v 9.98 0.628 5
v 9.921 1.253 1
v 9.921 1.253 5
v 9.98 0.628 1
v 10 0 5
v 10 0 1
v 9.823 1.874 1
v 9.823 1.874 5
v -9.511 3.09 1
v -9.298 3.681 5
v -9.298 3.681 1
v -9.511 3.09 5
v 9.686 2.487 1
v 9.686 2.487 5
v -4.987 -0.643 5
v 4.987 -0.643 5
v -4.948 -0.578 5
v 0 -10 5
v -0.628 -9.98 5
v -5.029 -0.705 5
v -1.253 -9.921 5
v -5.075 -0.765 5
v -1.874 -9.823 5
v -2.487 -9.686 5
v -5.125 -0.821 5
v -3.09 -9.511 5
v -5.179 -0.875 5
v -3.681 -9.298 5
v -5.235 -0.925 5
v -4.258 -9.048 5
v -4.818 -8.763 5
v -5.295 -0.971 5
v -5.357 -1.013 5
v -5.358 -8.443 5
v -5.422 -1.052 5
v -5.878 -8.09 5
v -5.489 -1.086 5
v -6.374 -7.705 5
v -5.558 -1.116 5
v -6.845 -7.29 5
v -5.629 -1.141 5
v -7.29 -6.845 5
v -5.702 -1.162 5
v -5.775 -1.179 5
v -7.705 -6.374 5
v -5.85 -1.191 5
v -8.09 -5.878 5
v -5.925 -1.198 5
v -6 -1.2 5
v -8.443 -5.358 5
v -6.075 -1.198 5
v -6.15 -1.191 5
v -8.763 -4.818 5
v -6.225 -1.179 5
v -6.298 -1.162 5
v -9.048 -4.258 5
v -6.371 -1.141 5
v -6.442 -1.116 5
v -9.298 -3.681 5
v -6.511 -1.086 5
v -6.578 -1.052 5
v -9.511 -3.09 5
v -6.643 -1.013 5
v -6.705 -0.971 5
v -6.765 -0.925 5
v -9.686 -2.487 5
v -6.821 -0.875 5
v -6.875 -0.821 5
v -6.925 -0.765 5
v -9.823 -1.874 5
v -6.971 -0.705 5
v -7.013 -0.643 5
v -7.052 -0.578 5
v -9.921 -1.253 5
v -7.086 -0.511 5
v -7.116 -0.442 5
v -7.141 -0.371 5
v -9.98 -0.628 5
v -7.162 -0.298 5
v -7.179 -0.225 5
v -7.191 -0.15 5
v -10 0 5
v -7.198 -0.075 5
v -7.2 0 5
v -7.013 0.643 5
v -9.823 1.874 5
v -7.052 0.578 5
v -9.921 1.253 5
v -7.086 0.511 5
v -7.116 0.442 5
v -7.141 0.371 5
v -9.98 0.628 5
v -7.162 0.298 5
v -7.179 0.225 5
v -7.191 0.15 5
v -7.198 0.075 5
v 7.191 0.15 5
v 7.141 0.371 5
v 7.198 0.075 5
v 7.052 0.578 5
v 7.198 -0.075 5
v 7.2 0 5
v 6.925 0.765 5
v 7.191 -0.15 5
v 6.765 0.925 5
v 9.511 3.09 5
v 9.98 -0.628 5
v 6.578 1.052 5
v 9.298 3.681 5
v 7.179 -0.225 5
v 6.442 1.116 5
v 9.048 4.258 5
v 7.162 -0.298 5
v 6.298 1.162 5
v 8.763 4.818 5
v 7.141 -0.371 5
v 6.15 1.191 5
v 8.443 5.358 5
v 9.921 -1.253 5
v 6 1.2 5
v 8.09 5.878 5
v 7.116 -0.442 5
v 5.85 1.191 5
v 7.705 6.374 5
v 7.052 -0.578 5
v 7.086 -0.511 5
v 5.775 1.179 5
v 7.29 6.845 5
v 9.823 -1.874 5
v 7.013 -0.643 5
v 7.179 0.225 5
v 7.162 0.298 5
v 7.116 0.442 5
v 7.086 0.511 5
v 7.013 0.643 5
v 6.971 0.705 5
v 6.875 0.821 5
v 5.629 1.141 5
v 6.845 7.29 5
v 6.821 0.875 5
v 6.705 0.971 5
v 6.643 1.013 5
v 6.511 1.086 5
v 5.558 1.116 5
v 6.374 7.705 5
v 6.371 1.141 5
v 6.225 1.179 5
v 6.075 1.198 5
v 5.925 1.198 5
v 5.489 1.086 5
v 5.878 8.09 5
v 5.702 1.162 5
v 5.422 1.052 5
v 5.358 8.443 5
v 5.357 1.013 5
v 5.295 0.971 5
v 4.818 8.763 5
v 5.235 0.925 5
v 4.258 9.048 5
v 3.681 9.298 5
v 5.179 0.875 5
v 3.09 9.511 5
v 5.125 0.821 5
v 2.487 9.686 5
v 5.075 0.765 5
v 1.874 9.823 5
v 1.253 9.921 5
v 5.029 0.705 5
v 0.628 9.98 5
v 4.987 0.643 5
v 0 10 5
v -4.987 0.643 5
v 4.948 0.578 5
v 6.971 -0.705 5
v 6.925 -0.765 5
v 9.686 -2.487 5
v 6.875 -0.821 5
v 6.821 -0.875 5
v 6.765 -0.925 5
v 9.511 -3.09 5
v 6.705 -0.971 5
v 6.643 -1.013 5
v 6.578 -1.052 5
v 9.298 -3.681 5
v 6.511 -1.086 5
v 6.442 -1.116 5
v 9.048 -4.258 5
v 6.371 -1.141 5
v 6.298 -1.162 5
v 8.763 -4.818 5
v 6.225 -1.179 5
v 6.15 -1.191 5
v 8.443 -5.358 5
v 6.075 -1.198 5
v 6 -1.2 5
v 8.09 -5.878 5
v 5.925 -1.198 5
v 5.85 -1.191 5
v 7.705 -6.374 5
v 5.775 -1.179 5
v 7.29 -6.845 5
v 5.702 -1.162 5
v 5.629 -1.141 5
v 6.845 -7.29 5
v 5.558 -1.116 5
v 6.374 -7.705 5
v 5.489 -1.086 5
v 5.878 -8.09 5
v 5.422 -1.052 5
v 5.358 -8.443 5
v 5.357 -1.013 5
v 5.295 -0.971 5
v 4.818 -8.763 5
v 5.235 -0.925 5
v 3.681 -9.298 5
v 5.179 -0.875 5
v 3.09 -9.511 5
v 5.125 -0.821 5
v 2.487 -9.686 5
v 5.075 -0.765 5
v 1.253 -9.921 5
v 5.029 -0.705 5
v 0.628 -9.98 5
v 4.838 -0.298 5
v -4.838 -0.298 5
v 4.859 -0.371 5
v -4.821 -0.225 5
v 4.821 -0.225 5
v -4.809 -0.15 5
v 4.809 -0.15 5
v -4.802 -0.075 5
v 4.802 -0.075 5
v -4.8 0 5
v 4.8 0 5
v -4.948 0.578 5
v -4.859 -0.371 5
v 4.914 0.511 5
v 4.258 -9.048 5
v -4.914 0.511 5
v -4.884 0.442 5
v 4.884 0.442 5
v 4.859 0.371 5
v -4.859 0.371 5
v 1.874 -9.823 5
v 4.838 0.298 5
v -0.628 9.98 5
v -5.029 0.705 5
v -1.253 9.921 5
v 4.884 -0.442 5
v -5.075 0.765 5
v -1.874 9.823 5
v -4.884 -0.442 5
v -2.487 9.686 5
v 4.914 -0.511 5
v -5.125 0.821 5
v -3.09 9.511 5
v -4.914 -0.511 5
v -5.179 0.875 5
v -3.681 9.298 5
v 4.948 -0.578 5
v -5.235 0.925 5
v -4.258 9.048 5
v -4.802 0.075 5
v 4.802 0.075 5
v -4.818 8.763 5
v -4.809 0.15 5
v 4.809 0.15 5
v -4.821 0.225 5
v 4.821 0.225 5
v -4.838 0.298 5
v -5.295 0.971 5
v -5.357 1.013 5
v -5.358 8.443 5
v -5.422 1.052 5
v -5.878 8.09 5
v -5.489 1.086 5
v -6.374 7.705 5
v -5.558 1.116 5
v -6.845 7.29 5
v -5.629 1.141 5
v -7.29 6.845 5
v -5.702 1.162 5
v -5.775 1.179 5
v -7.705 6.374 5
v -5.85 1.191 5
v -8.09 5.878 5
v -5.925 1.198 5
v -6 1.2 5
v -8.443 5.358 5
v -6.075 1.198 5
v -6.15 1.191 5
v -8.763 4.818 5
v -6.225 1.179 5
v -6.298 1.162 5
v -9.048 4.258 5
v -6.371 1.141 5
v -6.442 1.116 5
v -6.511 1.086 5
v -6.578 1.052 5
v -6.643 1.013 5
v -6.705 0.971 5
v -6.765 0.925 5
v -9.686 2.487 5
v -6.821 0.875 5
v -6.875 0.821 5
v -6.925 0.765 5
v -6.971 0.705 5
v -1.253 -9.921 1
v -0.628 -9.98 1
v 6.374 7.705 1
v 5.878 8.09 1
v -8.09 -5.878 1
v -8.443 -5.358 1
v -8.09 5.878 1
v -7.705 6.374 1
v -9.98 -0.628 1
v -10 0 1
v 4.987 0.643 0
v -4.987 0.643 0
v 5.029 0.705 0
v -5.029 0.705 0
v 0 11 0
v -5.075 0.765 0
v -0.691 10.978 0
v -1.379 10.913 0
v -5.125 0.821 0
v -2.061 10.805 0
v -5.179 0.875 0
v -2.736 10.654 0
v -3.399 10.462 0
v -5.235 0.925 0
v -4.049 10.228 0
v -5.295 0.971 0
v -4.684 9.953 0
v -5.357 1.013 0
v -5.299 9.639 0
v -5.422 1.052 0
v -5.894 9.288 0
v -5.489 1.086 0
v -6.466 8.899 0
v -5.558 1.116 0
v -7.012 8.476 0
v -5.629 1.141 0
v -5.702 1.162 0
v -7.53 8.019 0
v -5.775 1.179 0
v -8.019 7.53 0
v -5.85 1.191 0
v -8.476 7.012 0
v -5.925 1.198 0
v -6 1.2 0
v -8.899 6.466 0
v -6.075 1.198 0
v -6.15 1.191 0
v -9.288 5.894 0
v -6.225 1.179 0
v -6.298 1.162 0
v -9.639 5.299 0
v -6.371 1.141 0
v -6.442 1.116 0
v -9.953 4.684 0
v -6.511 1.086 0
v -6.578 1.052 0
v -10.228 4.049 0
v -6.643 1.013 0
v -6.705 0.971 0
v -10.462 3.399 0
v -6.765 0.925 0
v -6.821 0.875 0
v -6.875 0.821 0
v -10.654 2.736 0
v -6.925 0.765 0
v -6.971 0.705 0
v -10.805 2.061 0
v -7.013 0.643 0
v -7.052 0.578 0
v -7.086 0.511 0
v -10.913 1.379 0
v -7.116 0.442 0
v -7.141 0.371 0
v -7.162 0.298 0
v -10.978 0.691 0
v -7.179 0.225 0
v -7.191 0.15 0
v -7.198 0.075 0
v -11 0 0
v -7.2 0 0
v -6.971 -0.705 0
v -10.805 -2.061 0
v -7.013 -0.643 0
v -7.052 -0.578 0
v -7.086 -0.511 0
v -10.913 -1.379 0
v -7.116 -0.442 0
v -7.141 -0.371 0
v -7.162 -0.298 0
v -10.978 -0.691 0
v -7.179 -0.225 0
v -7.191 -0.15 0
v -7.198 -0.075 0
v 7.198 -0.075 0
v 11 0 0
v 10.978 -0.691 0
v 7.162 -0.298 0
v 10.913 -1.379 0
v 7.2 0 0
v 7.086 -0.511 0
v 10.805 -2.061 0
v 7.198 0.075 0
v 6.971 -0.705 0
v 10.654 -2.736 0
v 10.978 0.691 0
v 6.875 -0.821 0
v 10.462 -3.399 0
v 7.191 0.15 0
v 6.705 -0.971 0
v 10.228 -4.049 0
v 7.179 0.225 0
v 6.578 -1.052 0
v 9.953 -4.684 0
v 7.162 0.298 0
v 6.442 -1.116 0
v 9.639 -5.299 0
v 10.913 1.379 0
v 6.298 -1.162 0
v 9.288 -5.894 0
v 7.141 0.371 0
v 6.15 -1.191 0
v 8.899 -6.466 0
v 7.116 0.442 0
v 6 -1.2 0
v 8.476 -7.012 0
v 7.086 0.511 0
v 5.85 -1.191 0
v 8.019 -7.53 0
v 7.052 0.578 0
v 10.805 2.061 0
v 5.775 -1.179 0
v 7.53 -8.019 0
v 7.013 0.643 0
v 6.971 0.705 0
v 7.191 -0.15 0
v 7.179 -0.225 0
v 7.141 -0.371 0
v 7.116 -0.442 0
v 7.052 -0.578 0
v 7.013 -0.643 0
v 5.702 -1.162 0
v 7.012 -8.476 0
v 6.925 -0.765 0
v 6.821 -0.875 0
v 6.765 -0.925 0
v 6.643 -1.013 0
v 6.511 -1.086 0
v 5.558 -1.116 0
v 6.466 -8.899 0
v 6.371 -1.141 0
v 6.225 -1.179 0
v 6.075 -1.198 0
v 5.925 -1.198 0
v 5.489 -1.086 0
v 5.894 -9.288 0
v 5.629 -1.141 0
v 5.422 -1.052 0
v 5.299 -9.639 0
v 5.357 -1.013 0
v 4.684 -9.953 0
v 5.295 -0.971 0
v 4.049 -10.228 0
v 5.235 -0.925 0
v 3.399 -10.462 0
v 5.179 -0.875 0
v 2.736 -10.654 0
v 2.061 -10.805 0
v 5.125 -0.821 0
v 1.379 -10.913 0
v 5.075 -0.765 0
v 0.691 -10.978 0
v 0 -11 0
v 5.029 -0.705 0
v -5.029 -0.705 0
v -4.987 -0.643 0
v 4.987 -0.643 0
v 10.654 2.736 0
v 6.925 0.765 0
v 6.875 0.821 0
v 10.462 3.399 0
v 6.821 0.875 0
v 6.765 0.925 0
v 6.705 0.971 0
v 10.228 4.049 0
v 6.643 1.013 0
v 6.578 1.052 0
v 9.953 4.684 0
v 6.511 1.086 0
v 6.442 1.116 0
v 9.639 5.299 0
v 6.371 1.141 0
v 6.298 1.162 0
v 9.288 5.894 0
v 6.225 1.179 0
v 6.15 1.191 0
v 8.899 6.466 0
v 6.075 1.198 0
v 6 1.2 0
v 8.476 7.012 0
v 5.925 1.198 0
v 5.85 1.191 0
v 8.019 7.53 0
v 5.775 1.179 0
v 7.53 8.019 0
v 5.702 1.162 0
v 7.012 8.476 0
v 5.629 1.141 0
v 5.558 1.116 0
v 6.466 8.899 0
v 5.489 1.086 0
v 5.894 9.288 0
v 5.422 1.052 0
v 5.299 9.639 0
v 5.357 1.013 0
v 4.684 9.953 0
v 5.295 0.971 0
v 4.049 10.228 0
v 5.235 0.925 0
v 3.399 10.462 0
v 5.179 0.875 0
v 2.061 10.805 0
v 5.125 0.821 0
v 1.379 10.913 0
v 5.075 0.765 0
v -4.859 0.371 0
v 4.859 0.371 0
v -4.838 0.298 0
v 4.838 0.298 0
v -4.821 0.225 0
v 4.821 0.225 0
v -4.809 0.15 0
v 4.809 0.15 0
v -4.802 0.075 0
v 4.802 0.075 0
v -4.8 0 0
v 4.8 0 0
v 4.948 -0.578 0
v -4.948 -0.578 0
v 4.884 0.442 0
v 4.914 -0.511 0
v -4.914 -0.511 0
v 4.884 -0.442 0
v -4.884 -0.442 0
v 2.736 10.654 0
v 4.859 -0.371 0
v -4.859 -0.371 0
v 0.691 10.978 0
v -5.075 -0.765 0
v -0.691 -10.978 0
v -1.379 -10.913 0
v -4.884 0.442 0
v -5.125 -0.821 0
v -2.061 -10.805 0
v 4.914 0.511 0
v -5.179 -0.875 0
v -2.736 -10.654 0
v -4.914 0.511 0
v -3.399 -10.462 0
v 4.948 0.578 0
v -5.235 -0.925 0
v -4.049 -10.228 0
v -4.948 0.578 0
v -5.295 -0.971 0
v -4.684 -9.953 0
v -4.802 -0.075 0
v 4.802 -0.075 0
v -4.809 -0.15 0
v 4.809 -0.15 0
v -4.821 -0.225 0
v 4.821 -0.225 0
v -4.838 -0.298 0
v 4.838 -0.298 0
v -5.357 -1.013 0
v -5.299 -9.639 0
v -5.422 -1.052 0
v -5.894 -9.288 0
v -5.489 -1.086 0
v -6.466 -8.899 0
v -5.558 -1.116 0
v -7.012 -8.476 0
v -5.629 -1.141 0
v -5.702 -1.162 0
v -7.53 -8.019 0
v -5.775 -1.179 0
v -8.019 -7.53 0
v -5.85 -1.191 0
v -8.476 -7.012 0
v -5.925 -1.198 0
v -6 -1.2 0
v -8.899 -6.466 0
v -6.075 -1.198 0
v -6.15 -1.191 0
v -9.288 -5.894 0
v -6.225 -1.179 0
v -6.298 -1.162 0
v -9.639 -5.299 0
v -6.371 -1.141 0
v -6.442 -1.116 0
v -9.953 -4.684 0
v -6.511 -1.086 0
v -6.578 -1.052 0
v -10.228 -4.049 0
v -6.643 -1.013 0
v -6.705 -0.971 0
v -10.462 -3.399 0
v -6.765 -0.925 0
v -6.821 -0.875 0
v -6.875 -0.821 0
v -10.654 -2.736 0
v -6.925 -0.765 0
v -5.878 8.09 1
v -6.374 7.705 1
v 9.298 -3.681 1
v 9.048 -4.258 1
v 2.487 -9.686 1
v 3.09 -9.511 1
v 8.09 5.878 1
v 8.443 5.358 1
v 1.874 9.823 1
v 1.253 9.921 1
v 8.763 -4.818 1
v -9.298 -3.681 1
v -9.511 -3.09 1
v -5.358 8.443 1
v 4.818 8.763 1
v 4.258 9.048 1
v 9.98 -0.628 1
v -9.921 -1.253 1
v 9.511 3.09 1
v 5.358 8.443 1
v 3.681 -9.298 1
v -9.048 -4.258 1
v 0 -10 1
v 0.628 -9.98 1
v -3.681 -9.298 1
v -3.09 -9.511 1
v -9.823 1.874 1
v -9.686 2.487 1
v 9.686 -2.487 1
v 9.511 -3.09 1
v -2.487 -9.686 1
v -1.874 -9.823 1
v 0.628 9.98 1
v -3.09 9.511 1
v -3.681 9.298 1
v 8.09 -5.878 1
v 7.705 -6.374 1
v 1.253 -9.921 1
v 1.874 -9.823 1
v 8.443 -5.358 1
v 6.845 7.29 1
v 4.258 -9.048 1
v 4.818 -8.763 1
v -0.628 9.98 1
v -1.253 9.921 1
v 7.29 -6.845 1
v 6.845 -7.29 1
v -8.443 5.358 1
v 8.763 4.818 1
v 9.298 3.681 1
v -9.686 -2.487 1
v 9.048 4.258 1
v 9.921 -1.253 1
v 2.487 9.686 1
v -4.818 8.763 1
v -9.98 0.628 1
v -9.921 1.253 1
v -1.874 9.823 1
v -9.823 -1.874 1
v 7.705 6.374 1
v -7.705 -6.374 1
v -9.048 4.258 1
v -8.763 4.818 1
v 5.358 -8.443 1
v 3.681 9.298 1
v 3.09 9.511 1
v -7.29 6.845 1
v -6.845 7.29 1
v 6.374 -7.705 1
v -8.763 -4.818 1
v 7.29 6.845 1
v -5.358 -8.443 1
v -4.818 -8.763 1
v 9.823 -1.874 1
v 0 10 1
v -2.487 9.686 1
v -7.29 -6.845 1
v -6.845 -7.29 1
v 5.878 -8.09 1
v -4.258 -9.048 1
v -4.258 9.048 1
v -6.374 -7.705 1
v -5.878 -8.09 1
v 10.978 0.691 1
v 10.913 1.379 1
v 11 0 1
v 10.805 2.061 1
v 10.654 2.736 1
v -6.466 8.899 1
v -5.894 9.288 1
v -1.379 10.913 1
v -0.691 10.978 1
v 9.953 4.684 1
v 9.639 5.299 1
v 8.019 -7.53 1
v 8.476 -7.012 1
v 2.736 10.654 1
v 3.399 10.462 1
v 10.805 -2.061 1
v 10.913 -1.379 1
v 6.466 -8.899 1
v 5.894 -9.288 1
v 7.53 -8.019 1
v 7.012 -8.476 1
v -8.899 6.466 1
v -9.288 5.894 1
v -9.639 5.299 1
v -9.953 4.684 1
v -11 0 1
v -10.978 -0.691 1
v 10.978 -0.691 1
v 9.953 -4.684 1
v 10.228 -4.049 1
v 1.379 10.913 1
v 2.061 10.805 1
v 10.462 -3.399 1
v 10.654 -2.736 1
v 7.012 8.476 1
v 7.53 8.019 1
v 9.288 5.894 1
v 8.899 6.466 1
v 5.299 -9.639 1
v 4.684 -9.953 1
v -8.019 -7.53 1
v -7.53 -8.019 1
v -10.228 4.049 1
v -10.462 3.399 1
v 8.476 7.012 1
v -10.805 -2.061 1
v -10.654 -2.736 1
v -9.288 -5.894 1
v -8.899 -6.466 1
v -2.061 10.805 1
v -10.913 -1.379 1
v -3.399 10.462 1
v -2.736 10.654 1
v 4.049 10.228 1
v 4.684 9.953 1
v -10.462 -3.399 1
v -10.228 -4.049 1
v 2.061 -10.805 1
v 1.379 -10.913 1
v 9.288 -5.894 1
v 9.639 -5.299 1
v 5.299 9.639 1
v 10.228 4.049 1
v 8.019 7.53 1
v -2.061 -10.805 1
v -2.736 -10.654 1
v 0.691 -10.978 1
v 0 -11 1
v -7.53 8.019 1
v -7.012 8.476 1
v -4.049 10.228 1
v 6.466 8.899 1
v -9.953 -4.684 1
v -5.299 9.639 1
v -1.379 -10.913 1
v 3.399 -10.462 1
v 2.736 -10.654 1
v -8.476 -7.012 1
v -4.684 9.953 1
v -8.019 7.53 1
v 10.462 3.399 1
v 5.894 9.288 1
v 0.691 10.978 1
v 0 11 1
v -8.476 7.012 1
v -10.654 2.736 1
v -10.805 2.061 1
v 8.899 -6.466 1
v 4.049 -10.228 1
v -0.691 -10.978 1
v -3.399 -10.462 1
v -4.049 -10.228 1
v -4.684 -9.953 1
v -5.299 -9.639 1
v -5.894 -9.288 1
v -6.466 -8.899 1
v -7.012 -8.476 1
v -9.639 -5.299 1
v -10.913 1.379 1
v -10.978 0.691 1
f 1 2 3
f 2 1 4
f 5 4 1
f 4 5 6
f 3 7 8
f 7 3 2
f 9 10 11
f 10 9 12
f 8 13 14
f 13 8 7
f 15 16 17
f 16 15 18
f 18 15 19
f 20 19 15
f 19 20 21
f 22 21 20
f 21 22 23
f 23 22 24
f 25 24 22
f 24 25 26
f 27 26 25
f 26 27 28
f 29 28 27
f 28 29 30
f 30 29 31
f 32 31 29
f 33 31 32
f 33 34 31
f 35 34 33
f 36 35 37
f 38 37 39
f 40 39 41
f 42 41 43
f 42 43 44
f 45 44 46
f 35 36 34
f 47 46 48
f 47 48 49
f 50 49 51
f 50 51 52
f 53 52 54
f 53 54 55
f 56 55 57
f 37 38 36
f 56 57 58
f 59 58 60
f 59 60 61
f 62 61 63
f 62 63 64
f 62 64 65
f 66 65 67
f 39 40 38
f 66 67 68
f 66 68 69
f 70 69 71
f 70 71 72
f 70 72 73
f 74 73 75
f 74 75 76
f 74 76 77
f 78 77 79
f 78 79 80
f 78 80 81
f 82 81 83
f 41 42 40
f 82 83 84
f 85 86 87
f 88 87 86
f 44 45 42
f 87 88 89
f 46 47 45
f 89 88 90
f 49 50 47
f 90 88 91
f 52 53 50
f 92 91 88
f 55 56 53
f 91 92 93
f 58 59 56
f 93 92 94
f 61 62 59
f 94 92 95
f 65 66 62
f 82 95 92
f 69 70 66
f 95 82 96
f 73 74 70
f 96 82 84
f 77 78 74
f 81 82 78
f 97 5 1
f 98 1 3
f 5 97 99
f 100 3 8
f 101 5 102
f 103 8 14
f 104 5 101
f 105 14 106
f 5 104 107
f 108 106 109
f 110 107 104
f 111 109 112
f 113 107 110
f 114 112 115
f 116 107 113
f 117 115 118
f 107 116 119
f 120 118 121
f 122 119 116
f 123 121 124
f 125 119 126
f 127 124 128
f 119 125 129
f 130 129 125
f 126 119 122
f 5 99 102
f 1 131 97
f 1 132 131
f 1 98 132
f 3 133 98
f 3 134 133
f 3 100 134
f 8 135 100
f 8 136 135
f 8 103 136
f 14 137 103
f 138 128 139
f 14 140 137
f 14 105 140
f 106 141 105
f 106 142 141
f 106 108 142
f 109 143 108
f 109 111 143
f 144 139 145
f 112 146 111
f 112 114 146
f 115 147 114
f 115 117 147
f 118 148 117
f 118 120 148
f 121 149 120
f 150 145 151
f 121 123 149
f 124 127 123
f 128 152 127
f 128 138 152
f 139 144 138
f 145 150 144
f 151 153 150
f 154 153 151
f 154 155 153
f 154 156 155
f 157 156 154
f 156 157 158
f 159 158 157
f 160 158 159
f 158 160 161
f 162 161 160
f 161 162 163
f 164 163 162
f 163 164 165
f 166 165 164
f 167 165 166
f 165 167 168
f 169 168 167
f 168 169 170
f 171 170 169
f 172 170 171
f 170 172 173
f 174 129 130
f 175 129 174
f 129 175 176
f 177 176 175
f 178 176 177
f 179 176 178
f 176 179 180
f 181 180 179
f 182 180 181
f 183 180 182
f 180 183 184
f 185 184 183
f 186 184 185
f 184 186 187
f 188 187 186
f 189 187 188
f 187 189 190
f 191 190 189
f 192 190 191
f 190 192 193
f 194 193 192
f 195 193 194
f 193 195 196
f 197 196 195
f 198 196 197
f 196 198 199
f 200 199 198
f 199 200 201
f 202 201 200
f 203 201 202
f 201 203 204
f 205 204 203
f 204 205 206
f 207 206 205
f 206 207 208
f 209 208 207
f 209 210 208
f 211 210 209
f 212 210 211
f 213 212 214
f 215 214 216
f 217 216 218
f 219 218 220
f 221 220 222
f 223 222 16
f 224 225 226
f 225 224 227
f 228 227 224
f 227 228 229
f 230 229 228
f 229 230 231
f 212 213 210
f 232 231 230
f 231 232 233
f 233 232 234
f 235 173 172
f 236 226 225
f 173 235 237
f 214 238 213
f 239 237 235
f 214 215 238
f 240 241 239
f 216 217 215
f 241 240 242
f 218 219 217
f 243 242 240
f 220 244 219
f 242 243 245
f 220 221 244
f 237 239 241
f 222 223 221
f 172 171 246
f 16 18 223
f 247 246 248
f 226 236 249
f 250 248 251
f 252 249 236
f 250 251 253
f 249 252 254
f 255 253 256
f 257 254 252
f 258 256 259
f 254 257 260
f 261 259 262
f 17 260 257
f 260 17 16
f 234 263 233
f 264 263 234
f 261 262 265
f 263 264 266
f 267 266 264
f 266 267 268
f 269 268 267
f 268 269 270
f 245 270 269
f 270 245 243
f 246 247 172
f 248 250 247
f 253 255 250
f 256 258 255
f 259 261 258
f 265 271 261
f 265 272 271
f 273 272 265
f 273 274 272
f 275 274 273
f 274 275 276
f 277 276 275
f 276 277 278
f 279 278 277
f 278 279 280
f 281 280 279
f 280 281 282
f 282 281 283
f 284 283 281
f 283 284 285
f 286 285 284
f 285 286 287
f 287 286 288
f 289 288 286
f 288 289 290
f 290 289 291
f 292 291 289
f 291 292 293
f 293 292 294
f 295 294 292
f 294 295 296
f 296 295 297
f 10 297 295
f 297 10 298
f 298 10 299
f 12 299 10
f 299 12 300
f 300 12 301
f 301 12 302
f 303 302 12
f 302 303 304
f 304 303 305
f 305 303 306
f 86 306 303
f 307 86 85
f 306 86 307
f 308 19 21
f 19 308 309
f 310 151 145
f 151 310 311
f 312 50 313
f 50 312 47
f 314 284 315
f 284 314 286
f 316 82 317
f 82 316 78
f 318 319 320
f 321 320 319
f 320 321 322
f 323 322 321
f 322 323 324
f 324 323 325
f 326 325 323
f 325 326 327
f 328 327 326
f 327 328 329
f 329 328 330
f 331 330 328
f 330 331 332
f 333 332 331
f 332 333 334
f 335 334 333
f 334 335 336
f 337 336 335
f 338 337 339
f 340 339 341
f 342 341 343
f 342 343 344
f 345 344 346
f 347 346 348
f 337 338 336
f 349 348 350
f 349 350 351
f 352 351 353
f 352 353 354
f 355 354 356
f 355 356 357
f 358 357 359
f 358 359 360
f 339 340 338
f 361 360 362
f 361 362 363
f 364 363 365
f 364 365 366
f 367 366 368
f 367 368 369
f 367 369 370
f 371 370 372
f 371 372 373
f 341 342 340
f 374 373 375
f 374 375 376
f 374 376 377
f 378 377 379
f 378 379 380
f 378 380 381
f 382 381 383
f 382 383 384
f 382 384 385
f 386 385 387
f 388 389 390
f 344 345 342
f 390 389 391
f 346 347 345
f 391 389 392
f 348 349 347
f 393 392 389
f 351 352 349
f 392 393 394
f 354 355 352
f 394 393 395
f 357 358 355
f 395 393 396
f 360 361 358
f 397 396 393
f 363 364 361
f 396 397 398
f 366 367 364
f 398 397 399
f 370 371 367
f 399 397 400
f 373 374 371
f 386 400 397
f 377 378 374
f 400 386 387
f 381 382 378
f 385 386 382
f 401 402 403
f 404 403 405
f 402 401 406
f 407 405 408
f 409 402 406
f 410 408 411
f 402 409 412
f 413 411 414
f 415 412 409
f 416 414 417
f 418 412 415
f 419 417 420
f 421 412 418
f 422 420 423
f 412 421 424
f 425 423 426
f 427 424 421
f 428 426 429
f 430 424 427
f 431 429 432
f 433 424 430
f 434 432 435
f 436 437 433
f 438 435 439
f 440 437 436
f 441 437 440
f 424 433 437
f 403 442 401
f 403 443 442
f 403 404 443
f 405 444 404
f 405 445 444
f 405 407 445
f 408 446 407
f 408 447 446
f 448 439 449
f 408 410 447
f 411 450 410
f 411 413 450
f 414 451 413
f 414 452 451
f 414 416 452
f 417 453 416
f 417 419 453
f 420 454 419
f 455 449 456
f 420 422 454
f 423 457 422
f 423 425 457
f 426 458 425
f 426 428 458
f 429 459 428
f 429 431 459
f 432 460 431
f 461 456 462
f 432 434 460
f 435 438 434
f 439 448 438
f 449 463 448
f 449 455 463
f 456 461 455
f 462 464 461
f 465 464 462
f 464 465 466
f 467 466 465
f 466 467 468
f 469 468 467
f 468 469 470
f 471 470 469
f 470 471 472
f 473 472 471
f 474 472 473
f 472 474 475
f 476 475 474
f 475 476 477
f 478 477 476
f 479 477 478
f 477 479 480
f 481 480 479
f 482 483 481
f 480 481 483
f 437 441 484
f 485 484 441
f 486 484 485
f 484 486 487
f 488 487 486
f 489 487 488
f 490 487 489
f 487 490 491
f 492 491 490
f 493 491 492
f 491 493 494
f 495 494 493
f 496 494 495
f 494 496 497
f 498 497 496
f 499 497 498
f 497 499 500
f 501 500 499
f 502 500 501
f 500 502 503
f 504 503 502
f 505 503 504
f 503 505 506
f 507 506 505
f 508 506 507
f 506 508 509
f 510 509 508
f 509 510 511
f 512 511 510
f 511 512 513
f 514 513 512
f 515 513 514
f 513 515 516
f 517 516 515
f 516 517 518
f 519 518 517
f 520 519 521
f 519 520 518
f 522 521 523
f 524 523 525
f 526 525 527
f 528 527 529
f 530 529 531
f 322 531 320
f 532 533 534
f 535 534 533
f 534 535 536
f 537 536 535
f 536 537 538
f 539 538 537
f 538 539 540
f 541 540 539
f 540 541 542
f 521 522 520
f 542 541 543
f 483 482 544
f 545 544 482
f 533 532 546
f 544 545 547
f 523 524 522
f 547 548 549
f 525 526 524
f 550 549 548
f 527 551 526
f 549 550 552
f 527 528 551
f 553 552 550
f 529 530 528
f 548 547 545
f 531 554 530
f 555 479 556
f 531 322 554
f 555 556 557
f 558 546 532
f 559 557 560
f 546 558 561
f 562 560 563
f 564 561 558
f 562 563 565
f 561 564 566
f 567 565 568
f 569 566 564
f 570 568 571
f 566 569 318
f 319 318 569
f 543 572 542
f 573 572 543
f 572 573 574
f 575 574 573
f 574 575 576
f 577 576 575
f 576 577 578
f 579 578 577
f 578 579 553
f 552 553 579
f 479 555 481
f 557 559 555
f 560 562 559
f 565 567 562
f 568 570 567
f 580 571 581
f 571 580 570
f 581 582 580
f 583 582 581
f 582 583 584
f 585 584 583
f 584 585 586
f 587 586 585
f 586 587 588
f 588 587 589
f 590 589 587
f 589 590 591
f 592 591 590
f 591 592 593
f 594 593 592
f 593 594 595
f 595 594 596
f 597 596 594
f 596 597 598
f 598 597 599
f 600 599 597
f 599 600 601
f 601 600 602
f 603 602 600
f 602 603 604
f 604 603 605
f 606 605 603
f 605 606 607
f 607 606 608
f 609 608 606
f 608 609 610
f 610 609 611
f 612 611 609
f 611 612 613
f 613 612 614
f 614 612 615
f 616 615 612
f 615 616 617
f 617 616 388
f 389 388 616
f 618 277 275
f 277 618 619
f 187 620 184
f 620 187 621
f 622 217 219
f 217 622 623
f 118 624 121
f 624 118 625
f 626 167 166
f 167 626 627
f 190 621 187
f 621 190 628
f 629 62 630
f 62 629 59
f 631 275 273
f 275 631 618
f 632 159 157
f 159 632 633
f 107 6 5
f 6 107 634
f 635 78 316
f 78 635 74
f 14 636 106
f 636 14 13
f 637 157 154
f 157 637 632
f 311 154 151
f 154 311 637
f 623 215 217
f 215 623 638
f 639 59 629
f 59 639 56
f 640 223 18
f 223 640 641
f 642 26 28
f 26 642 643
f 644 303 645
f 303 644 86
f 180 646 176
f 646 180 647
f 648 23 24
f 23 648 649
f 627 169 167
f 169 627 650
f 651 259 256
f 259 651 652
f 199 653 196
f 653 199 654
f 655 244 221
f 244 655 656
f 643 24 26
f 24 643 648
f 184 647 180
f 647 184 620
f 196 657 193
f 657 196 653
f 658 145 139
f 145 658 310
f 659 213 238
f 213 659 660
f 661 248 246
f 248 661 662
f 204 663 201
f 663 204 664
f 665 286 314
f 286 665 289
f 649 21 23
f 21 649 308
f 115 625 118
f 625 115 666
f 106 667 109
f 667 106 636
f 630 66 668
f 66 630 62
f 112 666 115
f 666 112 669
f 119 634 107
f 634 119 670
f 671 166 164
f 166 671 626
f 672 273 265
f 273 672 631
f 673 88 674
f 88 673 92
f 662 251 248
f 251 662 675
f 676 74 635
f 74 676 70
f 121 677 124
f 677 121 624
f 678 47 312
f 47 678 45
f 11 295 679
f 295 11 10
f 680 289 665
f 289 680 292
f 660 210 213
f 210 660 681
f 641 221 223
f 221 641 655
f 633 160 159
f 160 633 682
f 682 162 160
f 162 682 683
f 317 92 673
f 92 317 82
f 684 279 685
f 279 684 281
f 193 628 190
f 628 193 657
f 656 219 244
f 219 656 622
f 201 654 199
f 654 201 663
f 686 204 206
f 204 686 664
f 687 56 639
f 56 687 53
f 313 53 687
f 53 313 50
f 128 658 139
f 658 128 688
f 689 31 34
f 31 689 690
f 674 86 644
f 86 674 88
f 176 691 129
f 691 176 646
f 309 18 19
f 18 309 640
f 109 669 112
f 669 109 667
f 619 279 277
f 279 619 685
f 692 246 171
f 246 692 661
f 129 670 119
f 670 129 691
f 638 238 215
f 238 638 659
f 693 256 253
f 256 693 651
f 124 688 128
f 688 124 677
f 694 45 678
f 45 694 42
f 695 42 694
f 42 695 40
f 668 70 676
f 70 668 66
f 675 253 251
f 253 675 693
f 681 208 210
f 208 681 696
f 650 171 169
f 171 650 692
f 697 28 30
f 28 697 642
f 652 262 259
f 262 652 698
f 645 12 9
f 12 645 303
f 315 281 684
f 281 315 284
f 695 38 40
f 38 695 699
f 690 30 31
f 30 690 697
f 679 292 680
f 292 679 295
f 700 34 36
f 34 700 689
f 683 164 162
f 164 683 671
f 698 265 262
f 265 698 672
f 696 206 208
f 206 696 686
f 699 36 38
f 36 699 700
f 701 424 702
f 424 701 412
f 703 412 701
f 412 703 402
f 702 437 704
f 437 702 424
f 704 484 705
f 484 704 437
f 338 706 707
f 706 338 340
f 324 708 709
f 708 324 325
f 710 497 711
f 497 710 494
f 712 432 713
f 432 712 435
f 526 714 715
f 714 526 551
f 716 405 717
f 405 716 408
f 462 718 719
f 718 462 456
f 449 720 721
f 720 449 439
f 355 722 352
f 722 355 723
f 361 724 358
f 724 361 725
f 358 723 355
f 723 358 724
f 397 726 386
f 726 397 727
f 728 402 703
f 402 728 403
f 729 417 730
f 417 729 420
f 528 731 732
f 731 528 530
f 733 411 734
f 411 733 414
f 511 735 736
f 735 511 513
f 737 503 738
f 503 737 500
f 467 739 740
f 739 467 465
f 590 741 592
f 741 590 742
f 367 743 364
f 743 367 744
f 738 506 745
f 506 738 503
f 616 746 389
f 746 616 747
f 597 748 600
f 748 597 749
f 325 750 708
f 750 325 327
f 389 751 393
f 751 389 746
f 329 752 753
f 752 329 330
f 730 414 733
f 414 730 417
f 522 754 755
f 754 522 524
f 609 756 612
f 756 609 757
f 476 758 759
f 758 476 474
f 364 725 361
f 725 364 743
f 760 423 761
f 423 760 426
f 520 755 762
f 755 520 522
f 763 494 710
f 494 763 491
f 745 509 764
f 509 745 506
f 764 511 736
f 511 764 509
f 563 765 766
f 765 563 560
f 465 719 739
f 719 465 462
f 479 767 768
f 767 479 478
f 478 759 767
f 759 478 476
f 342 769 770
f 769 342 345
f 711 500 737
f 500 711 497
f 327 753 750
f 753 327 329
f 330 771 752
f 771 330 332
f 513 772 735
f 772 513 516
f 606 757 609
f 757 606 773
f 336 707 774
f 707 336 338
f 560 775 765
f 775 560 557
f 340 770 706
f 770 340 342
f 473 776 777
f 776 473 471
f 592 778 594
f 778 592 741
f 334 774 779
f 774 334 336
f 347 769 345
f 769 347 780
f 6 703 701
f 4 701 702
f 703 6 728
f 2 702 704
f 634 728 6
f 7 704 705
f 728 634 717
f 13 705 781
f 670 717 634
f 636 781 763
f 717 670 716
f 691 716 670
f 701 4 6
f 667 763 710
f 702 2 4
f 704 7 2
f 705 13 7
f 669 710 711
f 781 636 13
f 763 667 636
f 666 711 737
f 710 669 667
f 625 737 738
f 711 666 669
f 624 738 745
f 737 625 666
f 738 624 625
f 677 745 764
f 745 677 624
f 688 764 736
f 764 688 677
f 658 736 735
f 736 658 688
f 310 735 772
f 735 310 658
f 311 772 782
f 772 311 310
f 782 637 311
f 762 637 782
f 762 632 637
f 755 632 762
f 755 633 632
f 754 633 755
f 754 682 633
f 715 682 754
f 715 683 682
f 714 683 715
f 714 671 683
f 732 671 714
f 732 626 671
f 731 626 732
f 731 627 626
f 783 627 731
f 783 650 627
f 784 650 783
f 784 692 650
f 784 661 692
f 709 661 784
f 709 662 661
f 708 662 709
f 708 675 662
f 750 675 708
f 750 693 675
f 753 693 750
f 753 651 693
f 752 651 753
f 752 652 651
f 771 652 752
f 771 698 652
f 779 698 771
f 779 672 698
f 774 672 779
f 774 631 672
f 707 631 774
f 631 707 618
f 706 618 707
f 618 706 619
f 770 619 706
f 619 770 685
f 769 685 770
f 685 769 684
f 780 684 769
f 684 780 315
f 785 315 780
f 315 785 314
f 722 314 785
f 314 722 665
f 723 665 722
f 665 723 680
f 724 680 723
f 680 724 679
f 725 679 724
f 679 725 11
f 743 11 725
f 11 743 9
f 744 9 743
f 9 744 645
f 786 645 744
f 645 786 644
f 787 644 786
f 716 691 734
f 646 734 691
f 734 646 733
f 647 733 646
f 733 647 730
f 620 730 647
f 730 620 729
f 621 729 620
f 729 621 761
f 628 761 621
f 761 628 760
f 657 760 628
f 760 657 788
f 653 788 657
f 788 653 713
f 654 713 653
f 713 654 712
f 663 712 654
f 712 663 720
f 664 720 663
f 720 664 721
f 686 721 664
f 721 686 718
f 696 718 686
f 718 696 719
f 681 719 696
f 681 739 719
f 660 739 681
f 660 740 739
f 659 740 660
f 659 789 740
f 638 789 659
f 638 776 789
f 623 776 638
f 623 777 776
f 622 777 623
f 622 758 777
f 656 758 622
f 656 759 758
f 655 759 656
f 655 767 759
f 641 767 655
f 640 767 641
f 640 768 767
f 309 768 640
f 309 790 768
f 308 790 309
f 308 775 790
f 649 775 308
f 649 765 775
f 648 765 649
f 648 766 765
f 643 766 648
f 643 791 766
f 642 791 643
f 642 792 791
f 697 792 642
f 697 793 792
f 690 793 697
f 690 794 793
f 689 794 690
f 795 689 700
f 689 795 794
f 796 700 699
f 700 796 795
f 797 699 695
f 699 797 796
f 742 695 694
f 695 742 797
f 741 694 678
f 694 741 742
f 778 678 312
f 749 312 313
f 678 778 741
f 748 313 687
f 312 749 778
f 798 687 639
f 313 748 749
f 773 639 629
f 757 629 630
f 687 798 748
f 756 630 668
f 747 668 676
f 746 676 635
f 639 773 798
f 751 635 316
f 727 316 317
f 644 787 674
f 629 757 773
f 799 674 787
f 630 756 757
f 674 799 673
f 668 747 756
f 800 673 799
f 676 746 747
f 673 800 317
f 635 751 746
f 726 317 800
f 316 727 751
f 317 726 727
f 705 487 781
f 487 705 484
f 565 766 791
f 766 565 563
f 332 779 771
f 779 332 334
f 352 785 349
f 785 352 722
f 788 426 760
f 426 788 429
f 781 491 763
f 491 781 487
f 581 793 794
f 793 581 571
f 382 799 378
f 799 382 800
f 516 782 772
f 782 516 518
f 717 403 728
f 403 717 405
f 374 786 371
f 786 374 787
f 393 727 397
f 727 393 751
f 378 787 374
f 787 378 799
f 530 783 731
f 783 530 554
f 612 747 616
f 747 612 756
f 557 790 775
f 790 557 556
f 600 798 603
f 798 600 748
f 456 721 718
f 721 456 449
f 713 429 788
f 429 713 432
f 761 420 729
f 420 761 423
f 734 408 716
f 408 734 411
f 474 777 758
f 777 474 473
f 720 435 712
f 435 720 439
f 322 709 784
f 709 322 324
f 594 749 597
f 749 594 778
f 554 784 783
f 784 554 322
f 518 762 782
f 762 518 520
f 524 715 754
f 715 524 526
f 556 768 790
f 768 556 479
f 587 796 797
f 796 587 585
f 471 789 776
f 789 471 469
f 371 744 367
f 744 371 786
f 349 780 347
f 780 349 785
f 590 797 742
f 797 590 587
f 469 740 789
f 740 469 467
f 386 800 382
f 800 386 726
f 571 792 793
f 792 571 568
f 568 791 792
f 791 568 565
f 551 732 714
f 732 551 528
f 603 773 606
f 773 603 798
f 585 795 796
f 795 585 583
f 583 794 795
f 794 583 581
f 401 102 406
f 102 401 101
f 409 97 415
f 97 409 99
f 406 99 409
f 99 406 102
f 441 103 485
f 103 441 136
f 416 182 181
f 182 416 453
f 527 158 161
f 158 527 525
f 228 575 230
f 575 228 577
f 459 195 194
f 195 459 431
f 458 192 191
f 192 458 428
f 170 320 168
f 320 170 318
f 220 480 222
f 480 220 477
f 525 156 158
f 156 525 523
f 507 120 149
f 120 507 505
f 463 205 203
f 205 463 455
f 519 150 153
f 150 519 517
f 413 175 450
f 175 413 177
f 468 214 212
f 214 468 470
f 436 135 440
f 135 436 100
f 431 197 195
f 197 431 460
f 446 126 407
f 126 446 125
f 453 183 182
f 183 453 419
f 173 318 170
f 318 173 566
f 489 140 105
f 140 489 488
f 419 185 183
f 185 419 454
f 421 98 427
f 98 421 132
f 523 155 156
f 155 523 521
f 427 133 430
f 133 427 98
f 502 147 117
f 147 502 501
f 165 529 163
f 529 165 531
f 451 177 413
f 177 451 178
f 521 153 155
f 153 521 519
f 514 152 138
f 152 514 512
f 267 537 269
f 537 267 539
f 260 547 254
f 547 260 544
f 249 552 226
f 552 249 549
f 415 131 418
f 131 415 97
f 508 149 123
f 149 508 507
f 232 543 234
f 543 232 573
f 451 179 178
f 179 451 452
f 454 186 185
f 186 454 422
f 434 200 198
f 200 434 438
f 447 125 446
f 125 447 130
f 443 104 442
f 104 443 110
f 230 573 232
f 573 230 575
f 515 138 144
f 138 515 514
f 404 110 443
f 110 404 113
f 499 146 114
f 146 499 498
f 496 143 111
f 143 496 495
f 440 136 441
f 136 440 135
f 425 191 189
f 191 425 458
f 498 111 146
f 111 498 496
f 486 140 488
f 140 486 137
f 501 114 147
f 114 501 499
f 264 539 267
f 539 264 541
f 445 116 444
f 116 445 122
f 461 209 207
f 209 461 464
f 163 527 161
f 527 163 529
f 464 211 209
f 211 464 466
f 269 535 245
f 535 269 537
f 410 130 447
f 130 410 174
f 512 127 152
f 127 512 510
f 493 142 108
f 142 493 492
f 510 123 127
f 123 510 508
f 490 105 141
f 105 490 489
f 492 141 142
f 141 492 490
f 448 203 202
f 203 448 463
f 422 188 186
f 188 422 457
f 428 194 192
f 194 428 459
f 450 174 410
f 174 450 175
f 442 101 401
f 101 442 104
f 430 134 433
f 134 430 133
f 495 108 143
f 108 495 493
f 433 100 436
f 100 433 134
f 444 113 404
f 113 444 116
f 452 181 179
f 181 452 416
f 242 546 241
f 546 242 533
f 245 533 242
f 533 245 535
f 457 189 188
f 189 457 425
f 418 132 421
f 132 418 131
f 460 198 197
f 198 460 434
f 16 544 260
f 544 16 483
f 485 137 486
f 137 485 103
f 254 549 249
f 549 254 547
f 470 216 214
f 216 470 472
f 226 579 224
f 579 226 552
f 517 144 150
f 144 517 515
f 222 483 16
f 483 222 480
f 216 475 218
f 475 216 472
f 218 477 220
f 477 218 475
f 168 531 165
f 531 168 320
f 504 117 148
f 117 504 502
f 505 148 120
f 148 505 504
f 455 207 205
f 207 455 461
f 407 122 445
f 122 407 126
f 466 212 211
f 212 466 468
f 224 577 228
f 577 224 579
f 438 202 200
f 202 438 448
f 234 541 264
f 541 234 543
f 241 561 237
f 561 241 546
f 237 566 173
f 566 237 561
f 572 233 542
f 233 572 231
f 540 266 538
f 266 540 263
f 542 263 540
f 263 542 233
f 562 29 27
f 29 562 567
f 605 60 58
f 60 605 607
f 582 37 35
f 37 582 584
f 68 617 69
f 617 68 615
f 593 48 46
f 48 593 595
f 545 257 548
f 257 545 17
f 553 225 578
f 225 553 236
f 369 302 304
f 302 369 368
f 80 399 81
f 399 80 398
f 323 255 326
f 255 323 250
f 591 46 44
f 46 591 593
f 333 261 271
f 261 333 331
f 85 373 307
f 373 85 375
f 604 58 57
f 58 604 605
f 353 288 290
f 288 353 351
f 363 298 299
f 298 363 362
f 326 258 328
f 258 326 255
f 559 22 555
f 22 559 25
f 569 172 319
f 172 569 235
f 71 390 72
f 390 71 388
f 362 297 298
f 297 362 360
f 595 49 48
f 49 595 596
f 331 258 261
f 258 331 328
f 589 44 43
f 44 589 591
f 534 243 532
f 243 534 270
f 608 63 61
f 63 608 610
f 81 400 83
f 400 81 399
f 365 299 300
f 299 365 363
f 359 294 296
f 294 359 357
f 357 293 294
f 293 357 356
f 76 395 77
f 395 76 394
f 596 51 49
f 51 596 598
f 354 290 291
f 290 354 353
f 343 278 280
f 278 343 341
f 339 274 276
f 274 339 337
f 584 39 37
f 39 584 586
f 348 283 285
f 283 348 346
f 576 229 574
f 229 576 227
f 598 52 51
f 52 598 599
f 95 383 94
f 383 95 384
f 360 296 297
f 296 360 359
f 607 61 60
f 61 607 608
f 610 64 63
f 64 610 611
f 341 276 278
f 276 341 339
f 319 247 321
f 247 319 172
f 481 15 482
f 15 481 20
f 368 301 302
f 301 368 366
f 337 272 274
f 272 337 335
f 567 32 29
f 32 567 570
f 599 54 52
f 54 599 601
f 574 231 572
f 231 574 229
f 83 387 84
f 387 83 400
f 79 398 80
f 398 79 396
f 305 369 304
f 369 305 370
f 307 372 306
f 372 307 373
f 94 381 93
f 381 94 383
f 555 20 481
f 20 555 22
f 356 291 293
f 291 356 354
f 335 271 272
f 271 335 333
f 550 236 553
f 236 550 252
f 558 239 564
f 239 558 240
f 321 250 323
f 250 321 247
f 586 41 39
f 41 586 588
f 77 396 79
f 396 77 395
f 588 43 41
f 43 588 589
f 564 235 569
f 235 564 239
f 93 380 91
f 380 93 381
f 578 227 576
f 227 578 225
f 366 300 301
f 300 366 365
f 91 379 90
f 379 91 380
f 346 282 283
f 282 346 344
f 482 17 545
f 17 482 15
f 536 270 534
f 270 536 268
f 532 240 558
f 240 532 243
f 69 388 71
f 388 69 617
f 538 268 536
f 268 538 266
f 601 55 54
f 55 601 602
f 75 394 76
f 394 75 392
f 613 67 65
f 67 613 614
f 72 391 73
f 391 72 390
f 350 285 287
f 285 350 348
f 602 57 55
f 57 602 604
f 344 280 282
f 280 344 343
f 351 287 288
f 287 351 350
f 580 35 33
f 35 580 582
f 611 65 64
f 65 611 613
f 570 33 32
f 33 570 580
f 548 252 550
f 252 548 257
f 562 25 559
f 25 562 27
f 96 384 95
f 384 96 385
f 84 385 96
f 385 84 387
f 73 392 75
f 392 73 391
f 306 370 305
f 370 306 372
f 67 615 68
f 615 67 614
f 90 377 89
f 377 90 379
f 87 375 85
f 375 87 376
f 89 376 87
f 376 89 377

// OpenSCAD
diameter = 20;   // CHANGE THIS
radius = diameter / 2;
thickness = 1;
cap_height = 4;
hole_radius = 1.2; // CHANGE THIS

difference() {
  union() {
    cylinder($fn=100, cap_height+thickness, radius, radius);
    cylinder($fn=100, thickness, radius+thickness, radius+thickness);
  }
  translate([6,0,-1])
    cylinder($fn=100, cap_height+thickness+2, hole_radius, hole_radius);
  translate([-6,0,-1])
    cylinder($fn=100, cap_height+thickness+2, hole_radius, hole_radius);
}
